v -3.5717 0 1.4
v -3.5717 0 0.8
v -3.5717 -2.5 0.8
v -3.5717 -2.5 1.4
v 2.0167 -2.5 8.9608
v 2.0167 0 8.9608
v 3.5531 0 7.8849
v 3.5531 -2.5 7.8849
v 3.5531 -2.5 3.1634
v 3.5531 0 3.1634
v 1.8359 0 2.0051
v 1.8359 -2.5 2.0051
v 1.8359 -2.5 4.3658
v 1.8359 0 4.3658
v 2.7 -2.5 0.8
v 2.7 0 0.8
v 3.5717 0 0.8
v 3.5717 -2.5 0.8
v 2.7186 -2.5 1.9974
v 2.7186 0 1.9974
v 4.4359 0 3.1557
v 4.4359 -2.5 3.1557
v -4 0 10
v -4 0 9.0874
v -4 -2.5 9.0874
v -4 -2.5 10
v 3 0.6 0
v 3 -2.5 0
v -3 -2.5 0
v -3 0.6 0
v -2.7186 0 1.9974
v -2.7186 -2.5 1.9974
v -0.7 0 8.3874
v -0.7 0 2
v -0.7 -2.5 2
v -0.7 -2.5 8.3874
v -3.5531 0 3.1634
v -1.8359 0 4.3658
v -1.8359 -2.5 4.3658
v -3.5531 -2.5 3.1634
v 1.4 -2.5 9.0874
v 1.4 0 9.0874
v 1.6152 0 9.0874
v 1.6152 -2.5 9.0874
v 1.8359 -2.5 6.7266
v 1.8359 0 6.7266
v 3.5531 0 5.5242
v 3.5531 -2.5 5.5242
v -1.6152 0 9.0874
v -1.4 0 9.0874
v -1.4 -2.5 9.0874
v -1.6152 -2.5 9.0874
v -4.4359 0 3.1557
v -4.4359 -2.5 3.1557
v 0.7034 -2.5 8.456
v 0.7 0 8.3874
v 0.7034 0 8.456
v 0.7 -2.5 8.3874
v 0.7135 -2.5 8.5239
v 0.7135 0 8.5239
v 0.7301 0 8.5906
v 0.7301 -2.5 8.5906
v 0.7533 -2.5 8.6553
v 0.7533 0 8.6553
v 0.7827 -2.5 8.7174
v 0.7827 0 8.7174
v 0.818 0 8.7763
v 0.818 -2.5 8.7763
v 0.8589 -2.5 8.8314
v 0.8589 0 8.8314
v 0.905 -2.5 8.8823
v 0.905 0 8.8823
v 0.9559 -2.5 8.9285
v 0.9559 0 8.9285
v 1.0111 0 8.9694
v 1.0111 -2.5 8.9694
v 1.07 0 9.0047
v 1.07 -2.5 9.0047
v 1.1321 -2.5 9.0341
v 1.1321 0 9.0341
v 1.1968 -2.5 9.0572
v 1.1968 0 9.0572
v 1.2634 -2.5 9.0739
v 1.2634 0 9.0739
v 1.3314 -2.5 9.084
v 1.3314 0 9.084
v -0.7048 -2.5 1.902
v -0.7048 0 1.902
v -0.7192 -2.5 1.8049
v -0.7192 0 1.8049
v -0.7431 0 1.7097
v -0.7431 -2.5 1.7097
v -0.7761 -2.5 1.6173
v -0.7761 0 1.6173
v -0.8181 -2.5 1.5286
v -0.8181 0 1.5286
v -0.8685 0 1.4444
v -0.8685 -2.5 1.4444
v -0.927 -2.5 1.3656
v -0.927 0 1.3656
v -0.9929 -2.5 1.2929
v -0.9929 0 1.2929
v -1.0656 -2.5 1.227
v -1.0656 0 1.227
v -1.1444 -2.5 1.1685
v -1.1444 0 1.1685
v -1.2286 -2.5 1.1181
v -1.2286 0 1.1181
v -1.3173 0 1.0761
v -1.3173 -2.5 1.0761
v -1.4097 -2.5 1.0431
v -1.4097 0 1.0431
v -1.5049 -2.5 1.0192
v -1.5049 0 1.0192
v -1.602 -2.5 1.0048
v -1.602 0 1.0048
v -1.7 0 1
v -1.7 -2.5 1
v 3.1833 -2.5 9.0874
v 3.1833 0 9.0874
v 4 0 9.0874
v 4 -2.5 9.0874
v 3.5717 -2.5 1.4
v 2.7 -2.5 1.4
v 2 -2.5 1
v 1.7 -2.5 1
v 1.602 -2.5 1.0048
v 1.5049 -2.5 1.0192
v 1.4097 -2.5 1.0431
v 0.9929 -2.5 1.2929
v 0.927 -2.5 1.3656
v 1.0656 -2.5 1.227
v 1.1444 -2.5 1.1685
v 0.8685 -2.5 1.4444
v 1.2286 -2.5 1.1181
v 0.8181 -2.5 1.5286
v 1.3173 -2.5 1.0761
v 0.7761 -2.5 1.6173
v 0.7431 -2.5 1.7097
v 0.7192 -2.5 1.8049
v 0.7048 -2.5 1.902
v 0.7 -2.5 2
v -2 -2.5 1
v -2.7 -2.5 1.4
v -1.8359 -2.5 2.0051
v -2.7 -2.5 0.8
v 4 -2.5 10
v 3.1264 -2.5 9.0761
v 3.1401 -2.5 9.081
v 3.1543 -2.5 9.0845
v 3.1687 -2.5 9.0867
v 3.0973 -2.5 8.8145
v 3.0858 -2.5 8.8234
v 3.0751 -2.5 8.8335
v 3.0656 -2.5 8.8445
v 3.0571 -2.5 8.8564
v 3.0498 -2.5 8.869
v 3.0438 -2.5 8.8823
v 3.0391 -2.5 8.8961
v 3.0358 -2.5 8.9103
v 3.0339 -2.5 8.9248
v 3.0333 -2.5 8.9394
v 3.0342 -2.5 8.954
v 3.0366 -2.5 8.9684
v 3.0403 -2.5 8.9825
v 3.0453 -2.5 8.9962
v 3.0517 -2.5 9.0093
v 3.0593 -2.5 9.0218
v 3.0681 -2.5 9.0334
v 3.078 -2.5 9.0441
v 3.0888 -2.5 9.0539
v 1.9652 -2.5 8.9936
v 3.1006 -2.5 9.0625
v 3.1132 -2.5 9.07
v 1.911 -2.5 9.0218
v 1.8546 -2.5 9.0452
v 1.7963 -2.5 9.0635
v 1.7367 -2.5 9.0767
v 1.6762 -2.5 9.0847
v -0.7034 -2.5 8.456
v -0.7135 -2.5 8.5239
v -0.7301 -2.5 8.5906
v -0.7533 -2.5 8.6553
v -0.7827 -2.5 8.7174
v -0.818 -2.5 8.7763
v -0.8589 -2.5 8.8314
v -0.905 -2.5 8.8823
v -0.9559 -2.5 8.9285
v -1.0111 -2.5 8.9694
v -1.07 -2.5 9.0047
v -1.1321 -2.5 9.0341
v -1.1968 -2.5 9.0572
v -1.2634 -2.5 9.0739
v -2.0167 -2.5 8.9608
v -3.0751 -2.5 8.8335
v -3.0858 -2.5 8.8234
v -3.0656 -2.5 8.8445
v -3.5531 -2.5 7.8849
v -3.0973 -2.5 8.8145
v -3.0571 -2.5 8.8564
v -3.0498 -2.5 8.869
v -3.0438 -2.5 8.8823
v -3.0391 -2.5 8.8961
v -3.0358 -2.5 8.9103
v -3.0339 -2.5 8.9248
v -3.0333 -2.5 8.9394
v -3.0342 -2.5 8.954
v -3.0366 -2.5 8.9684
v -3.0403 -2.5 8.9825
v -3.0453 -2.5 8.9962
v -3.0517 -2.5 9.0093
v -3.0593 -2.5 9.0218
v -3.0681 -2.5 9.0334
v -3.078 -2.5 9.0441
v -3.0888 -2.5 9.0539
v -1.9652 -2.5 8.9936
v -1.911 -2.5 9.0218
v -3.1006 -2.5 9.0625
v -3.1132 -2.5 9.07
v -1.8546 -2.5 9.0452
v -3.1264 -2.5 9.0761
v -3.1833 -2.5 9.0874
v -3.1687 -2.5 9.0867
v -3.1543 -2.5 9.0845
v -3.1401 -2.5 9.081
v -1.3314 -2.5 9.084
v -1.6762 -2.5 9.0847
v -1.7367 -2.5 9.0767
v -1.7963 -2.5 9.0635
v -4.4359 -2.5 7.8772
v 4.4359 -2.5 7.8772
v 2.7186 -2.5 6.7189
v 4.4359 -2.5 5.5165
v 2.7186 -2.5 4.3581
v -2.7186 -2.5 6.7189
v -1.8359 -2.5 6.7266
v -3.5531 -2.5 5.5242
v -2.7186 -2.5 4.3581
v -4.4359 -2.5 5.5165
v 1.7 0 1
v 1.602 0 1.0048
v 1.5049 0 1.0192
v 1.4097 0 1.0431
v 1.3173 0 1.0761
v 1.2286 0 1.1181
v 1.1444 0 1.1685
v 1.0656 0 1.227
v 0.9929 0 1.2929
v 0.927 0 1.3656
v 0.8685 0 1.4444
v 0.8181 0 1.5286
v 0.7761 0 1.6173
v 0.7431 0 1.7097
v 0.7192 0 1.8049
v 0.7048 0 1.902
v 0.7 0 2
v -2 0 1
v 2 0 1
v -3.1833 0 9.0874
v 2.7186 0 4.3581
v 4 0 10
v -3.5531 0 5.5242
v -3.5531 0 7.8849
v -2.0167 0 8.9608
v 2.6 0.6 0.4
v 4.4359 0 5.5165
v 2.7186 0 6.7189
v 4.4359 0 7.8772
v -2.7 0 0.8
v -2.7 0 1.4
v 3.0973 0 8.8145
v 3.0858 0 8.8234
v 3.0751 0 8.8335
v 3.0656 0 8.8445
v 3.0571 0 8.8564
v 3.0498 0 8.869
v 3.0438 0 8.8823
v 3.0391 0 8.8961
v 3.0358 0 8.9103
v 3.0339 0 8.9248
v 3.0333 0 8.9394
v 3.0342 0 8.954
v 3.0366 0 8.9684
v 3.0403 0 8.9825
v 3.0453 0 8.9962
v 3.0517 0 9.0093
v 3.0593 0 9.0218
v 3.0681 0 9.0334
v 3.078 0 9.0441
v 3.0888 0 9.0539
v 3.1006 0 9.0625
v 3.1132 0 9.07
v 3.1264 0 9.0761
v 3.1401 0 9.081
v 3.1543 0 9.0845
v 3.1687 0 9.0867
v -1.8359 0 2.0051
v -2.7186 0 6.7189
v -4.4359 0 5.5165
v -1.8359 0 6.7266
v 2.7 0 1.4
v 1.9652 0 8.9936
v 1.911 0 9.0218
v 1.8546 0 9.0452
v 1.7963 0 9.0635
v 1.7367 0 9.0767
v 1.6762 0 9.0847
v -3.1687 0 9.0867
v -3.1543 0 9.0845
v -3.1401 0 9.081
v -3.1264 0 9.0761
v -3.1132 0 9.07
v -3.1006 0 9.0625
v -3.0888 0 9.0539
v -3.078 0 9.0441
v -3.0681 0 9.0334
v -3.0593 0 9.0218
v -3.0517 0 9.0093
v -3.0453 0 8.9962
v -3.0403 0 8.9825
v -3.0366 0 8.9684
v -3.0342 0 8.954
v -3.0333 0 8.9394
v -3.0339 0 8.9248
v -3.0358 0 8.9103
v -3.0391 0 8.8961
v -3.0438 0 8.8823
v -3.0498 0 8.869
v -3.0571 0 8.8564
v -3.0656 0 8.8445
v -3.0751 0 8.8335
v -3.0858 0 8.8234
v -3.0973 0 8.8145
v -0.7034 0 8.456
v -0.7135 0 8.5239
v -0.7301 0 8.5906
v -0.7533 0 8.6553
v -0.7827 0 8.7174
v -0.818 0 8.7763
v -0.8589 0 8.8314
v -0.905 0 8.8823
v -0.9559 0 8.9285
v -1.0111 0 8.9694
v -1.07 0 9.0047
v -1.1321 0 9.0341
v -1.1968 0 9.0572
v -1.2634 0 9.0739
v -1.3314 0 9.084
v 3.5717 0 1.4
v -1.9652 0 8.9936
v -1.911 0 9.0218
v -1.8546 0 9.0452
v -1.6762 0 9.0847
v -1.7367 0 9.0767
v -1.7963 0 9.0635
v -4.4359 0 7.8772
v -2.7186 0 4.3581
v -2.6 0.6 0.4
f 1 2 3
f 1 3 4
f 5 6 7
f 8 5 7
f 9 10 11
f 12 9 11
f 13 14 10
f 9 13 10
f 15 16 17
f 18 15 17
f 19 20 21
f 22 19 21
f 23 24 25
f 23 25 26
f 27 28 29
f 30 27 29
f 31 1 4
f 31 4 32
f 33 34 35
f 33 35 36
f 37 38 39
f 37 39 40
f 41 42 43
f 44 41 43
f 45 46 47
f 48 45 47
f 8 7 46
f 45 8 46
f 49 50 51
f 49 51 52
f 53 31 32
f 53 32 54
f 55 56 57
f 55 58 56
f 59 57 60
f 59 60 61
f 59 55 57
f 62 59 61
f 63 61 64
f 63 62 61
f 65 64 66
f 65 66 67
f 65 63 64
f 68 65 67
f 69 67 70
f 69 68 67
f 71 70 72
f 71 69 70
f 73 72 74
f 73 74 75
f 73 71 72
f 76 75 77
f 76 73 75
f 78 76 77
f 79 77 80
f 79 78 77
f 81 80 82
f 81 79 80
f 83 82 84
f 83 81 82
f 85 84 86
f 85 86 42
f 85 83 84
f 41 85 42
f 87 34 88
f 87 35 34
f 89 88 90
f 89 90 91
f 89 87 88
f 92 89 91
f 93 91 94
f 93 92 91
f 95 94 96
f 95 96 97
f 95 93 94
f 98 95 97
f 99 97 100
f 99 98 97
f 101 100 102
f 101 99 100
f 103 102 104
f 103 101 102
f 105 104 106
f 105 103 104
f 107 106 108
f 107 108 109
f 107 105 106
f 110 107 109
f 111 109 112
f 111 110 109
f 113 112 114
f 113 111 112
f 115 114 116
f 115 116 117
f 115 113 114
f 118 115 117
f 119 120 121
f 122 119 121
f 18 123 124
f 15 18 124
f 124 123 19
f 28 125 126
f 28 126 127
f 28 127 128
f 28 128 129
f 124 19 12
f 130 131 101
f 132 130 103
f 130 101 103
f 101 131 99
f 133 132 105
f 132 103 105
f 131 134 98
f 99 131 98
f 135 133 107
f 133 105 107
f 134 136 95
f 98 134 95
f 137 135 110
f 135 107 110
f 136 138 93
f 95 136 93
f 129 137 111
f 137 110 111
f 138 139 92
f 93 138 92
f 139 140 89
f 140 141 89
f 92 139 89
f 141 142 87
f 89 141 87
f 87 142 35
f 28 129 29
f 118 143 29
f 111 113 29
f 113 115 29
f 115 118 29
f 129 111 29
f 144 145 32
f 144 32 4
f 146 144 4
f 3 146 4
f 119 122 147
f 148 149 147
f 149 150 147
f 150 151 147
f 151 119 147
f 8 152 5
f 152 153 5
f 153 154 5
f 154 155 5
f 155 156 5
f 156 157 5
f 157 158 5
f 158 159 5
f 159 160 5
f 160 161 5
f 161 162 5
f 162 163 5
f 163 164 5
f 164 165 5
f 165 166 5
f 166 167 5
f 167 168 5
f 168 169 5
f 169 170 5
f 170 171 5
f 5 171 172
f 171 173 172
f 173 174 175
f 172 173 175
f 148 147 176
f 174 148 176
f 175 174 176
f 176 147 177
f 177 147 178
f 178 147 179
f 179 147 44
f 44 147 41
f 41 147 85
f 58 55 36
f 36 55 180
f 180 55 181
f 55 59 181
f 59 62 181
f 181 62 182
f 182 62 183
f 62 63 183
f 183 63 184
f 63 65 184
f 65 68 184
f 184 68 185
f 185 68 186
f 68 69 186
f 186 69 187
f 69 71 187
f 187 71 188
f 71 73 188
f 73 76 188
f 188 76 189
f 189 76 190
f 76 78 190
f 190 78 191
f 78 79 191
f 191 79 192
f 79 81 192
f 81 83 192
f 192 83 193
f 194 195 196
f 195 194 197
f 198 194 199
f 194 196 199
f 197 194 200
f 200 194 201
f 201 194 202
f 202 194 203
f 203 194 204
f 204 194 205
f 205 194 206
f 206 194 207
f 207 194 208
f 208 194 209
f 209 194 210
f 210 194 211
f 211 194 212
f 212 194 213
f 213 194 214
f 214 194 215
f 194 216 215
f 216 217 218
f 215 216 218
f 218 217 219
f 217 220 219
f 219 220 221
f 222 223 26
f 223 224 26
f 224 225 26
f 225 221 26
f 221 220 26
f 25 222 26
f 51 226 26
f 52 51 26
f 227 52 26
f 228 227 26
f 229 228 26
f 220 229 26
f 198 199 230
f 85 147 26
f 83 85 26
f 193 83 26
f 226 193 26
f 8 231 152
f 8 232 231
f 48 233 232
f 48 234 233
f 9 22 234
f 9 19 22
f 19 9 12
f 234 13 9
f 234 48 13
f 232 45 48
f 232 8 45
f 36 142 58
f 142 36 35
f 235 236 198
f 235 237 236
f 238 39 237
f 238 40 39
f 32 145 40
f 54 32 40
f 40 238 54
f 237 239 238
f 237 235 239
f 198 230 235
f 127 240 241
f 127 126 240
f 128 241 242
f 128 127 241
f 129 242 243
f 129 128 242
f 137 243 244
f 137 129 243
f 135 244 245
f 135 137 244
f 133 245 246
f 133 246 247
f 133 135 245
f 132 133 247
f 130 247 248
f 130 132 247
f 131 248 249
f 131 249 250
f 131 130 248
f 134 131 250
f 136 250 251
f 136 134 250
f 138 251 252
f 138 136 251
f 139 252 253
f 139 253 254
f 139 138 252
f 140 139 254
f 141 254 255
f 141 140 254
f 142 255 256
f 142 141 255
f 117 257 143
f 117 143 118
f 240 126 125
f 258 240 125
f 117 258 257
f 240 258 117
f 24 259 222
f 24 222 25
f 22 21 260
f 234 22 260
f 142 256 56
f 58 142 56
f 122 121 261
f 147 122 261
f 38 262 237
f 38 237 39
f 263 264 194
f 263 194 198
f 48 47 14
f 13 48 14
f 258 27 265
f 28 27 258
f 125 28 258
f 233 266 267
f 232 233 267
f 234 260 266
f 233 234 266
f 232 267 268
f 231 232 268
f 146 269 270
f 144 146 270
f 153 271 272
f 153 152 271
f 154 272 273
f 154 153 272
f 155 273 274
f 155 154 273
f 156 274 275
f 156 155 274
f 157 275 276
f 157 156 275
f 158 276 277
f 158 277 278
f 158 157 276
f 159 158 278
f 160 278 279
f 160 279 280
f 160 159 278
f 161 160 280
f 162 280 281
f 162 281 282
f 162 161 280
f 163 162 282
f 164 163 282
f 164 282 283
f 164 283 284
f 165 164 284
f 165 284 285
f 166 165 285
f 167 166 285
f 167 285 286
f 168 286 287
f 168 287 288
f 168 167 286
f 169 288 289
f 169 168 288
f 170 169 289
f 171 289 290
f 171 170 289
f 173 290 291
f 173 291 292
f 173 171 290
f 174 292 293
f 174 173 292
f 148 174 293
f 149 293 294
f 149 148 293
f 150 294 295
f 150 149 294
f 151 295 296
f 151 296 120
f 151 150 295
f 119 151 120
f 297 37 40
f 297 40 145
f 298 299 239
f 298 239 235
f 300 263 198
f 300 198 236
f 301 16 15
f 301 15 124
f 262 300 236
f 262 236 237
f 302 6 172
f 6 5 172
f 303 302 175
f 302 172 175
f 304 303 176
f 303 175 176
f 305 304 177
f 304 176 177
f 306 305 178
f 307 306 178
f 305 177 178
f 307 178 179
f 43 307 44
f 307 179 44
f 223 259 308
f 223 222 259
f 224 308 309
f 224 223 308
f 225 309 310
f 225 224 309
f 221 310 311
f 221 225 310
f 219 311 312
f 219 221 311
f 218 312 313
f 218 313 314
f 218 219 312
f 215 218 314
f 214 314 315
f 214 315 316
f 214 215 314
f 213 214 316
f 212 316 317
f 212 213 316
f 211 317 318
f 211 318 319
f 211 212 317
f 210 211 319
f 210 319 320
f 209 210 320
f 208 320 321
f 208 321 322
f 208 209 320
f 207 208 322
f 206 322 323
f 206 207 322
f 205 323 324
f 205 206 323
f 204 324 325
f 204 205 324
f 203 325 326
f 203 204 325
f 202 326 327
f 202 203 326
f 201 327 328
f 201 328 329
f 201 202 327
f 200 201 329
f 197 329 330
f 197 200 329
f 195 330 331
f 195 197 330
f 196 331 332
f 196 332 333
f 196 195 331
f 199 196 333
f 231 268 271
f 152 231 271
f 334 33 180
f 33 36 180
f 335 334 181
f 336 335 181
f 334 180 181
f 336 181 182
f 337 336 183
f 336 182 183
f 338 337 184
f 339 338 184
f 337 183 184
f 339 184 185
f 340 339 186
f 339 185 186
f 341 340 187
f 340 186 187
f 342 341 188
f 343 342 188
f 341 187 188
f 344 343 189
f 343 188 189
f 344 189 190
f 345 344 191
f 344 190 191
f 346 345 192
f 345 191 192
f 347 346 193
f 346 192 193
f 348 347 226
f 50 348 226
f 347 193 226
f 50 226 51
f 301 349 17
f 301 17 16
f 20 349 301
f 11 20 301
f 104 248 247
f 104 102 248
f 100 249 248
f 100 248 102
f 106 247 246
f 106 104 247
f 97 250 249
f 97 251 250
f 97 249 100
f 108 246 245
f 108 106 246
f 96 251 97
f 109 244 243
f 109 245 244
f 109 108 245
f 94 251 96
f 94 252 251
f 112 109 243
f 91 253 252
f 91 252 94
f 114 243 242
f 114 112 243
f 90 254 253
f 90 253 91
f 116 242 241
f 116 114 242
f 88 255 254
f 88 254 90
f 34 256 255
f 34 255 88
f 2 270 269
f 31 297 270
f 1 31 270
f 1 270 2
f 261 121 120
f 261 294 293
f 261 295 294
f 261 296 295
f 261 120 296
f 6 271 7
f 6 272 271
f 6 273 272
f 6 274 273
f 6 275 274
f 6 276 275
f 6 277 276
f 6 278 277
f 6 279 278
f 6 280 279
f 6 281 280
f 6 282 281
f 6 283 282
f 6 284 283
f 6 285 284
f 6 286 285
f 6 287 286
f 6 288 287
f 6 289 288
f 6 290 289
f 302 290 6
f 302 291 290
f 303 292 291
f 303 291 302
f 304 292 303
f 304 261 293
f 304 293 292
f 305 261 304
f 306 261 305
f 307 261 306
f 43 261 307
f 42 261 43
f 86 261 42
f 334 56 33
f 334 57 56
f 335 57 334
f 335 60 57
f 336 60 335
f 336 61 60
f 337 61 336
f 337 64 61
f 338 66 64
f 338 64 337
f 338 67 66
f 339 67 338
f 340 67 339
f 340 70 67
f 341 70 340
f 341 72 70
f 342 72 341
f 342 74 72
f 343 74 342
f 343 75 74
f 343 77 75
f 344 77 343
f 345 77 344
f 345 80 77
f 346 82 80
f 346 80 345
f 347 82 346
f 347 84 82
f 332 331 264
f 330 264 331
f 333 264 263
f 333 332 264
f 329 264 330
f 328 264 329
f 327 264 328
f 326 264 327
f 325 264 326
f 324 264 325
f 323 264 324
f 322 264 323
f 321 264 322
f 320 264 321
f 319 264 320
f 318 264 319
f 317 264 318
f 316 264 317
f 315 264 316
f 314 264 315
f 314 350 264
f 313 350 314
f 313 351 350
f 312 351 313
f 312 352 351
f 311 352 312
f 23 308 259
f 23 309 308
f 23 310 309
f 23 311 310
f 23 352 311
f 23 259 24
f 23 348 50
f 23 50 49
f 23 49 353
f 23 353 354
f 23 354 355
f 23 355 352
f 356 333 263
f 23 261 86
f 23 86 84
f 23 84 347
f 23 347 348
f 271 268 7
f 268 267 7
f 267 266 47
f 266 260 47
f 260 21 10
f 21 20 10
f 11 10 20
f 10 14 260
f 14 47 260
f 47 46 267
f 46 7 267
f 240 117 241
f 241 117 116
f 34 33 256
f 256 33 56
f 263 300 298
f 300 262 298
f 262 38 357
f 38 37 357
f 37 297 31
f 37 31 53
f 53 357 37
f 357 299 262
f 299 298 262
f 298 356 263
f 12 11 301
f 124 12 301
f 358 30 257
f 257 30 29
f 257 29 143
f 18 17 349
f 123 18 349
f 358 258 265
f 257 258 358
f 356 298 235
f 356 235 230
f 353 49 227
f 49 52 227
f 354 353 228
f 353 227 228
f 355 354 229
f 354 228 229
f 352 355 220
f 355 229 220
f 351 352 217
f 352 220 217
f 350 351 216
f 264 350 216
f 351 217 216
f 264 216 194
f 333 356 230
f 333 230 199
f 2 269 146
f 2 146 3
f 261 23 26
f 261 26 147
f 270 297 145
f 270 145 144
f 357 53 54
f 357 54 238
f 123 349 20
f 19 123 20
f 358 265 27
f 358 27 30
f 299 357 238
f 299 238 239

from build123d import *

# Parameters (mm, degrees)
F0_W     = 0.8717233978
F0_H     = 0.6
F1_DEPTH = 2.5
F2_DEPTH = 0.6
F4_SIZE  = 0.59999
F5_R     = 0.7
F6_R     = 1
F7_R     = 0.15


# Not quite as in the source:
# - a fillet or chamfer is up to 0.001 mm smaller than in the source, because OpenCascade refuses the exact size


with BuildPart() as f1:
    # F0 (on Front) → F1 (new body)
    with BuildSketch(Plane.XZ):
        Polygon((0, 1), (0, 0), (3, 0), (2, 1), (0.7, 1), align=None)
        Polygon((2.7075850967, 9.087372576), (1.8358616989, 9.087372576), (3.5531366706, 7.8849236956), (1.8358616989, 6.7266071015), (3.5531366706, 5.5241582211), (1.8358616989, 4.365841627), (3.5531366706, 3.1633927466), (1.8358616989, 2.0050761525), (2.7, 1.4), (3.5717233978, 1.4), (2.7185867272, 1.9973727279), (4.4358616989, 3.155689322), (2.7185867272, 4.3581382024), (4.4358616989, 5.5164547965), (2.7185867272, 6.7189036769), (4.4358616989, 7.877220271), align=None)
        with Locations((3.1358616989, 1.1)):
            Rectangle(F0_W, F0_H)
        Polygon((0, 9), (0, 1), (0.7, 1), (0.7, 9.087372576), (1.8358616989, 9.087372576), (2.7075850967, 9.087372576), (4, 9.087372576), (4, 10), (0, 10), align=None)
    extrude(amount=F1_DEPTH)

    # F0 (on Front) → F2 (join)
    with BuildSketch(Plane.XZ):
        Polygon((0, 1), (0, 0), (3, 0), (2, 1), (0.7, 1), align=None)
    extrude(amount=-F2_DEPTH)

    # F3: F1 across face


with BuildPart() as f1_1:
    add(f1.part)
    add(f1.part.mirror(Plane(origin=(0, -1.213671875, 4.89453125), x_dir=(0, -1, 0), z_dir=(-1, 0, 0))))

    # F4 (size 0.6 in the source; OpenCascade refuses exactly that, so slightly less here)
    f4_edges = [f1_1.edges().sort_by_distance(p)[0] for p in [
        (0, 0.6, 1),
    ]]
    chamfer(f4_edges, length=F4_SIZE)

    # F5
    f5_edges = [f1_1.edges().sort_by_distance(p)[0] for p in [
        (0.7, -1.25, 9.087373),
        (-0.7, -1.25, 9.087373),
        (1.835862, -1.25, 9.087373),
        (-1.835862, -1.25, 9.087373),
    ]]
    fillet(f5_edges, radius=F5_R)

    # F6
    f6_edges = [f1_1.edges().sort_by_distance(p)[0] for p in [
        (0.7, -1.25, 1),
        (-0.7, -1.25, 1),
    ]]
    fillet(f6_edges, radius=F6_R)

    # F7
    f7_edges = [f1_1.edges().sort_by_distance(p)[0] for p in [
        (2.707585, -1.25, 9.087373),
        (-2.707585, -1.25, 9.087373),
    ]]
    fillet(f7_edges, radius=F7_R)


solid = f1_1.part
